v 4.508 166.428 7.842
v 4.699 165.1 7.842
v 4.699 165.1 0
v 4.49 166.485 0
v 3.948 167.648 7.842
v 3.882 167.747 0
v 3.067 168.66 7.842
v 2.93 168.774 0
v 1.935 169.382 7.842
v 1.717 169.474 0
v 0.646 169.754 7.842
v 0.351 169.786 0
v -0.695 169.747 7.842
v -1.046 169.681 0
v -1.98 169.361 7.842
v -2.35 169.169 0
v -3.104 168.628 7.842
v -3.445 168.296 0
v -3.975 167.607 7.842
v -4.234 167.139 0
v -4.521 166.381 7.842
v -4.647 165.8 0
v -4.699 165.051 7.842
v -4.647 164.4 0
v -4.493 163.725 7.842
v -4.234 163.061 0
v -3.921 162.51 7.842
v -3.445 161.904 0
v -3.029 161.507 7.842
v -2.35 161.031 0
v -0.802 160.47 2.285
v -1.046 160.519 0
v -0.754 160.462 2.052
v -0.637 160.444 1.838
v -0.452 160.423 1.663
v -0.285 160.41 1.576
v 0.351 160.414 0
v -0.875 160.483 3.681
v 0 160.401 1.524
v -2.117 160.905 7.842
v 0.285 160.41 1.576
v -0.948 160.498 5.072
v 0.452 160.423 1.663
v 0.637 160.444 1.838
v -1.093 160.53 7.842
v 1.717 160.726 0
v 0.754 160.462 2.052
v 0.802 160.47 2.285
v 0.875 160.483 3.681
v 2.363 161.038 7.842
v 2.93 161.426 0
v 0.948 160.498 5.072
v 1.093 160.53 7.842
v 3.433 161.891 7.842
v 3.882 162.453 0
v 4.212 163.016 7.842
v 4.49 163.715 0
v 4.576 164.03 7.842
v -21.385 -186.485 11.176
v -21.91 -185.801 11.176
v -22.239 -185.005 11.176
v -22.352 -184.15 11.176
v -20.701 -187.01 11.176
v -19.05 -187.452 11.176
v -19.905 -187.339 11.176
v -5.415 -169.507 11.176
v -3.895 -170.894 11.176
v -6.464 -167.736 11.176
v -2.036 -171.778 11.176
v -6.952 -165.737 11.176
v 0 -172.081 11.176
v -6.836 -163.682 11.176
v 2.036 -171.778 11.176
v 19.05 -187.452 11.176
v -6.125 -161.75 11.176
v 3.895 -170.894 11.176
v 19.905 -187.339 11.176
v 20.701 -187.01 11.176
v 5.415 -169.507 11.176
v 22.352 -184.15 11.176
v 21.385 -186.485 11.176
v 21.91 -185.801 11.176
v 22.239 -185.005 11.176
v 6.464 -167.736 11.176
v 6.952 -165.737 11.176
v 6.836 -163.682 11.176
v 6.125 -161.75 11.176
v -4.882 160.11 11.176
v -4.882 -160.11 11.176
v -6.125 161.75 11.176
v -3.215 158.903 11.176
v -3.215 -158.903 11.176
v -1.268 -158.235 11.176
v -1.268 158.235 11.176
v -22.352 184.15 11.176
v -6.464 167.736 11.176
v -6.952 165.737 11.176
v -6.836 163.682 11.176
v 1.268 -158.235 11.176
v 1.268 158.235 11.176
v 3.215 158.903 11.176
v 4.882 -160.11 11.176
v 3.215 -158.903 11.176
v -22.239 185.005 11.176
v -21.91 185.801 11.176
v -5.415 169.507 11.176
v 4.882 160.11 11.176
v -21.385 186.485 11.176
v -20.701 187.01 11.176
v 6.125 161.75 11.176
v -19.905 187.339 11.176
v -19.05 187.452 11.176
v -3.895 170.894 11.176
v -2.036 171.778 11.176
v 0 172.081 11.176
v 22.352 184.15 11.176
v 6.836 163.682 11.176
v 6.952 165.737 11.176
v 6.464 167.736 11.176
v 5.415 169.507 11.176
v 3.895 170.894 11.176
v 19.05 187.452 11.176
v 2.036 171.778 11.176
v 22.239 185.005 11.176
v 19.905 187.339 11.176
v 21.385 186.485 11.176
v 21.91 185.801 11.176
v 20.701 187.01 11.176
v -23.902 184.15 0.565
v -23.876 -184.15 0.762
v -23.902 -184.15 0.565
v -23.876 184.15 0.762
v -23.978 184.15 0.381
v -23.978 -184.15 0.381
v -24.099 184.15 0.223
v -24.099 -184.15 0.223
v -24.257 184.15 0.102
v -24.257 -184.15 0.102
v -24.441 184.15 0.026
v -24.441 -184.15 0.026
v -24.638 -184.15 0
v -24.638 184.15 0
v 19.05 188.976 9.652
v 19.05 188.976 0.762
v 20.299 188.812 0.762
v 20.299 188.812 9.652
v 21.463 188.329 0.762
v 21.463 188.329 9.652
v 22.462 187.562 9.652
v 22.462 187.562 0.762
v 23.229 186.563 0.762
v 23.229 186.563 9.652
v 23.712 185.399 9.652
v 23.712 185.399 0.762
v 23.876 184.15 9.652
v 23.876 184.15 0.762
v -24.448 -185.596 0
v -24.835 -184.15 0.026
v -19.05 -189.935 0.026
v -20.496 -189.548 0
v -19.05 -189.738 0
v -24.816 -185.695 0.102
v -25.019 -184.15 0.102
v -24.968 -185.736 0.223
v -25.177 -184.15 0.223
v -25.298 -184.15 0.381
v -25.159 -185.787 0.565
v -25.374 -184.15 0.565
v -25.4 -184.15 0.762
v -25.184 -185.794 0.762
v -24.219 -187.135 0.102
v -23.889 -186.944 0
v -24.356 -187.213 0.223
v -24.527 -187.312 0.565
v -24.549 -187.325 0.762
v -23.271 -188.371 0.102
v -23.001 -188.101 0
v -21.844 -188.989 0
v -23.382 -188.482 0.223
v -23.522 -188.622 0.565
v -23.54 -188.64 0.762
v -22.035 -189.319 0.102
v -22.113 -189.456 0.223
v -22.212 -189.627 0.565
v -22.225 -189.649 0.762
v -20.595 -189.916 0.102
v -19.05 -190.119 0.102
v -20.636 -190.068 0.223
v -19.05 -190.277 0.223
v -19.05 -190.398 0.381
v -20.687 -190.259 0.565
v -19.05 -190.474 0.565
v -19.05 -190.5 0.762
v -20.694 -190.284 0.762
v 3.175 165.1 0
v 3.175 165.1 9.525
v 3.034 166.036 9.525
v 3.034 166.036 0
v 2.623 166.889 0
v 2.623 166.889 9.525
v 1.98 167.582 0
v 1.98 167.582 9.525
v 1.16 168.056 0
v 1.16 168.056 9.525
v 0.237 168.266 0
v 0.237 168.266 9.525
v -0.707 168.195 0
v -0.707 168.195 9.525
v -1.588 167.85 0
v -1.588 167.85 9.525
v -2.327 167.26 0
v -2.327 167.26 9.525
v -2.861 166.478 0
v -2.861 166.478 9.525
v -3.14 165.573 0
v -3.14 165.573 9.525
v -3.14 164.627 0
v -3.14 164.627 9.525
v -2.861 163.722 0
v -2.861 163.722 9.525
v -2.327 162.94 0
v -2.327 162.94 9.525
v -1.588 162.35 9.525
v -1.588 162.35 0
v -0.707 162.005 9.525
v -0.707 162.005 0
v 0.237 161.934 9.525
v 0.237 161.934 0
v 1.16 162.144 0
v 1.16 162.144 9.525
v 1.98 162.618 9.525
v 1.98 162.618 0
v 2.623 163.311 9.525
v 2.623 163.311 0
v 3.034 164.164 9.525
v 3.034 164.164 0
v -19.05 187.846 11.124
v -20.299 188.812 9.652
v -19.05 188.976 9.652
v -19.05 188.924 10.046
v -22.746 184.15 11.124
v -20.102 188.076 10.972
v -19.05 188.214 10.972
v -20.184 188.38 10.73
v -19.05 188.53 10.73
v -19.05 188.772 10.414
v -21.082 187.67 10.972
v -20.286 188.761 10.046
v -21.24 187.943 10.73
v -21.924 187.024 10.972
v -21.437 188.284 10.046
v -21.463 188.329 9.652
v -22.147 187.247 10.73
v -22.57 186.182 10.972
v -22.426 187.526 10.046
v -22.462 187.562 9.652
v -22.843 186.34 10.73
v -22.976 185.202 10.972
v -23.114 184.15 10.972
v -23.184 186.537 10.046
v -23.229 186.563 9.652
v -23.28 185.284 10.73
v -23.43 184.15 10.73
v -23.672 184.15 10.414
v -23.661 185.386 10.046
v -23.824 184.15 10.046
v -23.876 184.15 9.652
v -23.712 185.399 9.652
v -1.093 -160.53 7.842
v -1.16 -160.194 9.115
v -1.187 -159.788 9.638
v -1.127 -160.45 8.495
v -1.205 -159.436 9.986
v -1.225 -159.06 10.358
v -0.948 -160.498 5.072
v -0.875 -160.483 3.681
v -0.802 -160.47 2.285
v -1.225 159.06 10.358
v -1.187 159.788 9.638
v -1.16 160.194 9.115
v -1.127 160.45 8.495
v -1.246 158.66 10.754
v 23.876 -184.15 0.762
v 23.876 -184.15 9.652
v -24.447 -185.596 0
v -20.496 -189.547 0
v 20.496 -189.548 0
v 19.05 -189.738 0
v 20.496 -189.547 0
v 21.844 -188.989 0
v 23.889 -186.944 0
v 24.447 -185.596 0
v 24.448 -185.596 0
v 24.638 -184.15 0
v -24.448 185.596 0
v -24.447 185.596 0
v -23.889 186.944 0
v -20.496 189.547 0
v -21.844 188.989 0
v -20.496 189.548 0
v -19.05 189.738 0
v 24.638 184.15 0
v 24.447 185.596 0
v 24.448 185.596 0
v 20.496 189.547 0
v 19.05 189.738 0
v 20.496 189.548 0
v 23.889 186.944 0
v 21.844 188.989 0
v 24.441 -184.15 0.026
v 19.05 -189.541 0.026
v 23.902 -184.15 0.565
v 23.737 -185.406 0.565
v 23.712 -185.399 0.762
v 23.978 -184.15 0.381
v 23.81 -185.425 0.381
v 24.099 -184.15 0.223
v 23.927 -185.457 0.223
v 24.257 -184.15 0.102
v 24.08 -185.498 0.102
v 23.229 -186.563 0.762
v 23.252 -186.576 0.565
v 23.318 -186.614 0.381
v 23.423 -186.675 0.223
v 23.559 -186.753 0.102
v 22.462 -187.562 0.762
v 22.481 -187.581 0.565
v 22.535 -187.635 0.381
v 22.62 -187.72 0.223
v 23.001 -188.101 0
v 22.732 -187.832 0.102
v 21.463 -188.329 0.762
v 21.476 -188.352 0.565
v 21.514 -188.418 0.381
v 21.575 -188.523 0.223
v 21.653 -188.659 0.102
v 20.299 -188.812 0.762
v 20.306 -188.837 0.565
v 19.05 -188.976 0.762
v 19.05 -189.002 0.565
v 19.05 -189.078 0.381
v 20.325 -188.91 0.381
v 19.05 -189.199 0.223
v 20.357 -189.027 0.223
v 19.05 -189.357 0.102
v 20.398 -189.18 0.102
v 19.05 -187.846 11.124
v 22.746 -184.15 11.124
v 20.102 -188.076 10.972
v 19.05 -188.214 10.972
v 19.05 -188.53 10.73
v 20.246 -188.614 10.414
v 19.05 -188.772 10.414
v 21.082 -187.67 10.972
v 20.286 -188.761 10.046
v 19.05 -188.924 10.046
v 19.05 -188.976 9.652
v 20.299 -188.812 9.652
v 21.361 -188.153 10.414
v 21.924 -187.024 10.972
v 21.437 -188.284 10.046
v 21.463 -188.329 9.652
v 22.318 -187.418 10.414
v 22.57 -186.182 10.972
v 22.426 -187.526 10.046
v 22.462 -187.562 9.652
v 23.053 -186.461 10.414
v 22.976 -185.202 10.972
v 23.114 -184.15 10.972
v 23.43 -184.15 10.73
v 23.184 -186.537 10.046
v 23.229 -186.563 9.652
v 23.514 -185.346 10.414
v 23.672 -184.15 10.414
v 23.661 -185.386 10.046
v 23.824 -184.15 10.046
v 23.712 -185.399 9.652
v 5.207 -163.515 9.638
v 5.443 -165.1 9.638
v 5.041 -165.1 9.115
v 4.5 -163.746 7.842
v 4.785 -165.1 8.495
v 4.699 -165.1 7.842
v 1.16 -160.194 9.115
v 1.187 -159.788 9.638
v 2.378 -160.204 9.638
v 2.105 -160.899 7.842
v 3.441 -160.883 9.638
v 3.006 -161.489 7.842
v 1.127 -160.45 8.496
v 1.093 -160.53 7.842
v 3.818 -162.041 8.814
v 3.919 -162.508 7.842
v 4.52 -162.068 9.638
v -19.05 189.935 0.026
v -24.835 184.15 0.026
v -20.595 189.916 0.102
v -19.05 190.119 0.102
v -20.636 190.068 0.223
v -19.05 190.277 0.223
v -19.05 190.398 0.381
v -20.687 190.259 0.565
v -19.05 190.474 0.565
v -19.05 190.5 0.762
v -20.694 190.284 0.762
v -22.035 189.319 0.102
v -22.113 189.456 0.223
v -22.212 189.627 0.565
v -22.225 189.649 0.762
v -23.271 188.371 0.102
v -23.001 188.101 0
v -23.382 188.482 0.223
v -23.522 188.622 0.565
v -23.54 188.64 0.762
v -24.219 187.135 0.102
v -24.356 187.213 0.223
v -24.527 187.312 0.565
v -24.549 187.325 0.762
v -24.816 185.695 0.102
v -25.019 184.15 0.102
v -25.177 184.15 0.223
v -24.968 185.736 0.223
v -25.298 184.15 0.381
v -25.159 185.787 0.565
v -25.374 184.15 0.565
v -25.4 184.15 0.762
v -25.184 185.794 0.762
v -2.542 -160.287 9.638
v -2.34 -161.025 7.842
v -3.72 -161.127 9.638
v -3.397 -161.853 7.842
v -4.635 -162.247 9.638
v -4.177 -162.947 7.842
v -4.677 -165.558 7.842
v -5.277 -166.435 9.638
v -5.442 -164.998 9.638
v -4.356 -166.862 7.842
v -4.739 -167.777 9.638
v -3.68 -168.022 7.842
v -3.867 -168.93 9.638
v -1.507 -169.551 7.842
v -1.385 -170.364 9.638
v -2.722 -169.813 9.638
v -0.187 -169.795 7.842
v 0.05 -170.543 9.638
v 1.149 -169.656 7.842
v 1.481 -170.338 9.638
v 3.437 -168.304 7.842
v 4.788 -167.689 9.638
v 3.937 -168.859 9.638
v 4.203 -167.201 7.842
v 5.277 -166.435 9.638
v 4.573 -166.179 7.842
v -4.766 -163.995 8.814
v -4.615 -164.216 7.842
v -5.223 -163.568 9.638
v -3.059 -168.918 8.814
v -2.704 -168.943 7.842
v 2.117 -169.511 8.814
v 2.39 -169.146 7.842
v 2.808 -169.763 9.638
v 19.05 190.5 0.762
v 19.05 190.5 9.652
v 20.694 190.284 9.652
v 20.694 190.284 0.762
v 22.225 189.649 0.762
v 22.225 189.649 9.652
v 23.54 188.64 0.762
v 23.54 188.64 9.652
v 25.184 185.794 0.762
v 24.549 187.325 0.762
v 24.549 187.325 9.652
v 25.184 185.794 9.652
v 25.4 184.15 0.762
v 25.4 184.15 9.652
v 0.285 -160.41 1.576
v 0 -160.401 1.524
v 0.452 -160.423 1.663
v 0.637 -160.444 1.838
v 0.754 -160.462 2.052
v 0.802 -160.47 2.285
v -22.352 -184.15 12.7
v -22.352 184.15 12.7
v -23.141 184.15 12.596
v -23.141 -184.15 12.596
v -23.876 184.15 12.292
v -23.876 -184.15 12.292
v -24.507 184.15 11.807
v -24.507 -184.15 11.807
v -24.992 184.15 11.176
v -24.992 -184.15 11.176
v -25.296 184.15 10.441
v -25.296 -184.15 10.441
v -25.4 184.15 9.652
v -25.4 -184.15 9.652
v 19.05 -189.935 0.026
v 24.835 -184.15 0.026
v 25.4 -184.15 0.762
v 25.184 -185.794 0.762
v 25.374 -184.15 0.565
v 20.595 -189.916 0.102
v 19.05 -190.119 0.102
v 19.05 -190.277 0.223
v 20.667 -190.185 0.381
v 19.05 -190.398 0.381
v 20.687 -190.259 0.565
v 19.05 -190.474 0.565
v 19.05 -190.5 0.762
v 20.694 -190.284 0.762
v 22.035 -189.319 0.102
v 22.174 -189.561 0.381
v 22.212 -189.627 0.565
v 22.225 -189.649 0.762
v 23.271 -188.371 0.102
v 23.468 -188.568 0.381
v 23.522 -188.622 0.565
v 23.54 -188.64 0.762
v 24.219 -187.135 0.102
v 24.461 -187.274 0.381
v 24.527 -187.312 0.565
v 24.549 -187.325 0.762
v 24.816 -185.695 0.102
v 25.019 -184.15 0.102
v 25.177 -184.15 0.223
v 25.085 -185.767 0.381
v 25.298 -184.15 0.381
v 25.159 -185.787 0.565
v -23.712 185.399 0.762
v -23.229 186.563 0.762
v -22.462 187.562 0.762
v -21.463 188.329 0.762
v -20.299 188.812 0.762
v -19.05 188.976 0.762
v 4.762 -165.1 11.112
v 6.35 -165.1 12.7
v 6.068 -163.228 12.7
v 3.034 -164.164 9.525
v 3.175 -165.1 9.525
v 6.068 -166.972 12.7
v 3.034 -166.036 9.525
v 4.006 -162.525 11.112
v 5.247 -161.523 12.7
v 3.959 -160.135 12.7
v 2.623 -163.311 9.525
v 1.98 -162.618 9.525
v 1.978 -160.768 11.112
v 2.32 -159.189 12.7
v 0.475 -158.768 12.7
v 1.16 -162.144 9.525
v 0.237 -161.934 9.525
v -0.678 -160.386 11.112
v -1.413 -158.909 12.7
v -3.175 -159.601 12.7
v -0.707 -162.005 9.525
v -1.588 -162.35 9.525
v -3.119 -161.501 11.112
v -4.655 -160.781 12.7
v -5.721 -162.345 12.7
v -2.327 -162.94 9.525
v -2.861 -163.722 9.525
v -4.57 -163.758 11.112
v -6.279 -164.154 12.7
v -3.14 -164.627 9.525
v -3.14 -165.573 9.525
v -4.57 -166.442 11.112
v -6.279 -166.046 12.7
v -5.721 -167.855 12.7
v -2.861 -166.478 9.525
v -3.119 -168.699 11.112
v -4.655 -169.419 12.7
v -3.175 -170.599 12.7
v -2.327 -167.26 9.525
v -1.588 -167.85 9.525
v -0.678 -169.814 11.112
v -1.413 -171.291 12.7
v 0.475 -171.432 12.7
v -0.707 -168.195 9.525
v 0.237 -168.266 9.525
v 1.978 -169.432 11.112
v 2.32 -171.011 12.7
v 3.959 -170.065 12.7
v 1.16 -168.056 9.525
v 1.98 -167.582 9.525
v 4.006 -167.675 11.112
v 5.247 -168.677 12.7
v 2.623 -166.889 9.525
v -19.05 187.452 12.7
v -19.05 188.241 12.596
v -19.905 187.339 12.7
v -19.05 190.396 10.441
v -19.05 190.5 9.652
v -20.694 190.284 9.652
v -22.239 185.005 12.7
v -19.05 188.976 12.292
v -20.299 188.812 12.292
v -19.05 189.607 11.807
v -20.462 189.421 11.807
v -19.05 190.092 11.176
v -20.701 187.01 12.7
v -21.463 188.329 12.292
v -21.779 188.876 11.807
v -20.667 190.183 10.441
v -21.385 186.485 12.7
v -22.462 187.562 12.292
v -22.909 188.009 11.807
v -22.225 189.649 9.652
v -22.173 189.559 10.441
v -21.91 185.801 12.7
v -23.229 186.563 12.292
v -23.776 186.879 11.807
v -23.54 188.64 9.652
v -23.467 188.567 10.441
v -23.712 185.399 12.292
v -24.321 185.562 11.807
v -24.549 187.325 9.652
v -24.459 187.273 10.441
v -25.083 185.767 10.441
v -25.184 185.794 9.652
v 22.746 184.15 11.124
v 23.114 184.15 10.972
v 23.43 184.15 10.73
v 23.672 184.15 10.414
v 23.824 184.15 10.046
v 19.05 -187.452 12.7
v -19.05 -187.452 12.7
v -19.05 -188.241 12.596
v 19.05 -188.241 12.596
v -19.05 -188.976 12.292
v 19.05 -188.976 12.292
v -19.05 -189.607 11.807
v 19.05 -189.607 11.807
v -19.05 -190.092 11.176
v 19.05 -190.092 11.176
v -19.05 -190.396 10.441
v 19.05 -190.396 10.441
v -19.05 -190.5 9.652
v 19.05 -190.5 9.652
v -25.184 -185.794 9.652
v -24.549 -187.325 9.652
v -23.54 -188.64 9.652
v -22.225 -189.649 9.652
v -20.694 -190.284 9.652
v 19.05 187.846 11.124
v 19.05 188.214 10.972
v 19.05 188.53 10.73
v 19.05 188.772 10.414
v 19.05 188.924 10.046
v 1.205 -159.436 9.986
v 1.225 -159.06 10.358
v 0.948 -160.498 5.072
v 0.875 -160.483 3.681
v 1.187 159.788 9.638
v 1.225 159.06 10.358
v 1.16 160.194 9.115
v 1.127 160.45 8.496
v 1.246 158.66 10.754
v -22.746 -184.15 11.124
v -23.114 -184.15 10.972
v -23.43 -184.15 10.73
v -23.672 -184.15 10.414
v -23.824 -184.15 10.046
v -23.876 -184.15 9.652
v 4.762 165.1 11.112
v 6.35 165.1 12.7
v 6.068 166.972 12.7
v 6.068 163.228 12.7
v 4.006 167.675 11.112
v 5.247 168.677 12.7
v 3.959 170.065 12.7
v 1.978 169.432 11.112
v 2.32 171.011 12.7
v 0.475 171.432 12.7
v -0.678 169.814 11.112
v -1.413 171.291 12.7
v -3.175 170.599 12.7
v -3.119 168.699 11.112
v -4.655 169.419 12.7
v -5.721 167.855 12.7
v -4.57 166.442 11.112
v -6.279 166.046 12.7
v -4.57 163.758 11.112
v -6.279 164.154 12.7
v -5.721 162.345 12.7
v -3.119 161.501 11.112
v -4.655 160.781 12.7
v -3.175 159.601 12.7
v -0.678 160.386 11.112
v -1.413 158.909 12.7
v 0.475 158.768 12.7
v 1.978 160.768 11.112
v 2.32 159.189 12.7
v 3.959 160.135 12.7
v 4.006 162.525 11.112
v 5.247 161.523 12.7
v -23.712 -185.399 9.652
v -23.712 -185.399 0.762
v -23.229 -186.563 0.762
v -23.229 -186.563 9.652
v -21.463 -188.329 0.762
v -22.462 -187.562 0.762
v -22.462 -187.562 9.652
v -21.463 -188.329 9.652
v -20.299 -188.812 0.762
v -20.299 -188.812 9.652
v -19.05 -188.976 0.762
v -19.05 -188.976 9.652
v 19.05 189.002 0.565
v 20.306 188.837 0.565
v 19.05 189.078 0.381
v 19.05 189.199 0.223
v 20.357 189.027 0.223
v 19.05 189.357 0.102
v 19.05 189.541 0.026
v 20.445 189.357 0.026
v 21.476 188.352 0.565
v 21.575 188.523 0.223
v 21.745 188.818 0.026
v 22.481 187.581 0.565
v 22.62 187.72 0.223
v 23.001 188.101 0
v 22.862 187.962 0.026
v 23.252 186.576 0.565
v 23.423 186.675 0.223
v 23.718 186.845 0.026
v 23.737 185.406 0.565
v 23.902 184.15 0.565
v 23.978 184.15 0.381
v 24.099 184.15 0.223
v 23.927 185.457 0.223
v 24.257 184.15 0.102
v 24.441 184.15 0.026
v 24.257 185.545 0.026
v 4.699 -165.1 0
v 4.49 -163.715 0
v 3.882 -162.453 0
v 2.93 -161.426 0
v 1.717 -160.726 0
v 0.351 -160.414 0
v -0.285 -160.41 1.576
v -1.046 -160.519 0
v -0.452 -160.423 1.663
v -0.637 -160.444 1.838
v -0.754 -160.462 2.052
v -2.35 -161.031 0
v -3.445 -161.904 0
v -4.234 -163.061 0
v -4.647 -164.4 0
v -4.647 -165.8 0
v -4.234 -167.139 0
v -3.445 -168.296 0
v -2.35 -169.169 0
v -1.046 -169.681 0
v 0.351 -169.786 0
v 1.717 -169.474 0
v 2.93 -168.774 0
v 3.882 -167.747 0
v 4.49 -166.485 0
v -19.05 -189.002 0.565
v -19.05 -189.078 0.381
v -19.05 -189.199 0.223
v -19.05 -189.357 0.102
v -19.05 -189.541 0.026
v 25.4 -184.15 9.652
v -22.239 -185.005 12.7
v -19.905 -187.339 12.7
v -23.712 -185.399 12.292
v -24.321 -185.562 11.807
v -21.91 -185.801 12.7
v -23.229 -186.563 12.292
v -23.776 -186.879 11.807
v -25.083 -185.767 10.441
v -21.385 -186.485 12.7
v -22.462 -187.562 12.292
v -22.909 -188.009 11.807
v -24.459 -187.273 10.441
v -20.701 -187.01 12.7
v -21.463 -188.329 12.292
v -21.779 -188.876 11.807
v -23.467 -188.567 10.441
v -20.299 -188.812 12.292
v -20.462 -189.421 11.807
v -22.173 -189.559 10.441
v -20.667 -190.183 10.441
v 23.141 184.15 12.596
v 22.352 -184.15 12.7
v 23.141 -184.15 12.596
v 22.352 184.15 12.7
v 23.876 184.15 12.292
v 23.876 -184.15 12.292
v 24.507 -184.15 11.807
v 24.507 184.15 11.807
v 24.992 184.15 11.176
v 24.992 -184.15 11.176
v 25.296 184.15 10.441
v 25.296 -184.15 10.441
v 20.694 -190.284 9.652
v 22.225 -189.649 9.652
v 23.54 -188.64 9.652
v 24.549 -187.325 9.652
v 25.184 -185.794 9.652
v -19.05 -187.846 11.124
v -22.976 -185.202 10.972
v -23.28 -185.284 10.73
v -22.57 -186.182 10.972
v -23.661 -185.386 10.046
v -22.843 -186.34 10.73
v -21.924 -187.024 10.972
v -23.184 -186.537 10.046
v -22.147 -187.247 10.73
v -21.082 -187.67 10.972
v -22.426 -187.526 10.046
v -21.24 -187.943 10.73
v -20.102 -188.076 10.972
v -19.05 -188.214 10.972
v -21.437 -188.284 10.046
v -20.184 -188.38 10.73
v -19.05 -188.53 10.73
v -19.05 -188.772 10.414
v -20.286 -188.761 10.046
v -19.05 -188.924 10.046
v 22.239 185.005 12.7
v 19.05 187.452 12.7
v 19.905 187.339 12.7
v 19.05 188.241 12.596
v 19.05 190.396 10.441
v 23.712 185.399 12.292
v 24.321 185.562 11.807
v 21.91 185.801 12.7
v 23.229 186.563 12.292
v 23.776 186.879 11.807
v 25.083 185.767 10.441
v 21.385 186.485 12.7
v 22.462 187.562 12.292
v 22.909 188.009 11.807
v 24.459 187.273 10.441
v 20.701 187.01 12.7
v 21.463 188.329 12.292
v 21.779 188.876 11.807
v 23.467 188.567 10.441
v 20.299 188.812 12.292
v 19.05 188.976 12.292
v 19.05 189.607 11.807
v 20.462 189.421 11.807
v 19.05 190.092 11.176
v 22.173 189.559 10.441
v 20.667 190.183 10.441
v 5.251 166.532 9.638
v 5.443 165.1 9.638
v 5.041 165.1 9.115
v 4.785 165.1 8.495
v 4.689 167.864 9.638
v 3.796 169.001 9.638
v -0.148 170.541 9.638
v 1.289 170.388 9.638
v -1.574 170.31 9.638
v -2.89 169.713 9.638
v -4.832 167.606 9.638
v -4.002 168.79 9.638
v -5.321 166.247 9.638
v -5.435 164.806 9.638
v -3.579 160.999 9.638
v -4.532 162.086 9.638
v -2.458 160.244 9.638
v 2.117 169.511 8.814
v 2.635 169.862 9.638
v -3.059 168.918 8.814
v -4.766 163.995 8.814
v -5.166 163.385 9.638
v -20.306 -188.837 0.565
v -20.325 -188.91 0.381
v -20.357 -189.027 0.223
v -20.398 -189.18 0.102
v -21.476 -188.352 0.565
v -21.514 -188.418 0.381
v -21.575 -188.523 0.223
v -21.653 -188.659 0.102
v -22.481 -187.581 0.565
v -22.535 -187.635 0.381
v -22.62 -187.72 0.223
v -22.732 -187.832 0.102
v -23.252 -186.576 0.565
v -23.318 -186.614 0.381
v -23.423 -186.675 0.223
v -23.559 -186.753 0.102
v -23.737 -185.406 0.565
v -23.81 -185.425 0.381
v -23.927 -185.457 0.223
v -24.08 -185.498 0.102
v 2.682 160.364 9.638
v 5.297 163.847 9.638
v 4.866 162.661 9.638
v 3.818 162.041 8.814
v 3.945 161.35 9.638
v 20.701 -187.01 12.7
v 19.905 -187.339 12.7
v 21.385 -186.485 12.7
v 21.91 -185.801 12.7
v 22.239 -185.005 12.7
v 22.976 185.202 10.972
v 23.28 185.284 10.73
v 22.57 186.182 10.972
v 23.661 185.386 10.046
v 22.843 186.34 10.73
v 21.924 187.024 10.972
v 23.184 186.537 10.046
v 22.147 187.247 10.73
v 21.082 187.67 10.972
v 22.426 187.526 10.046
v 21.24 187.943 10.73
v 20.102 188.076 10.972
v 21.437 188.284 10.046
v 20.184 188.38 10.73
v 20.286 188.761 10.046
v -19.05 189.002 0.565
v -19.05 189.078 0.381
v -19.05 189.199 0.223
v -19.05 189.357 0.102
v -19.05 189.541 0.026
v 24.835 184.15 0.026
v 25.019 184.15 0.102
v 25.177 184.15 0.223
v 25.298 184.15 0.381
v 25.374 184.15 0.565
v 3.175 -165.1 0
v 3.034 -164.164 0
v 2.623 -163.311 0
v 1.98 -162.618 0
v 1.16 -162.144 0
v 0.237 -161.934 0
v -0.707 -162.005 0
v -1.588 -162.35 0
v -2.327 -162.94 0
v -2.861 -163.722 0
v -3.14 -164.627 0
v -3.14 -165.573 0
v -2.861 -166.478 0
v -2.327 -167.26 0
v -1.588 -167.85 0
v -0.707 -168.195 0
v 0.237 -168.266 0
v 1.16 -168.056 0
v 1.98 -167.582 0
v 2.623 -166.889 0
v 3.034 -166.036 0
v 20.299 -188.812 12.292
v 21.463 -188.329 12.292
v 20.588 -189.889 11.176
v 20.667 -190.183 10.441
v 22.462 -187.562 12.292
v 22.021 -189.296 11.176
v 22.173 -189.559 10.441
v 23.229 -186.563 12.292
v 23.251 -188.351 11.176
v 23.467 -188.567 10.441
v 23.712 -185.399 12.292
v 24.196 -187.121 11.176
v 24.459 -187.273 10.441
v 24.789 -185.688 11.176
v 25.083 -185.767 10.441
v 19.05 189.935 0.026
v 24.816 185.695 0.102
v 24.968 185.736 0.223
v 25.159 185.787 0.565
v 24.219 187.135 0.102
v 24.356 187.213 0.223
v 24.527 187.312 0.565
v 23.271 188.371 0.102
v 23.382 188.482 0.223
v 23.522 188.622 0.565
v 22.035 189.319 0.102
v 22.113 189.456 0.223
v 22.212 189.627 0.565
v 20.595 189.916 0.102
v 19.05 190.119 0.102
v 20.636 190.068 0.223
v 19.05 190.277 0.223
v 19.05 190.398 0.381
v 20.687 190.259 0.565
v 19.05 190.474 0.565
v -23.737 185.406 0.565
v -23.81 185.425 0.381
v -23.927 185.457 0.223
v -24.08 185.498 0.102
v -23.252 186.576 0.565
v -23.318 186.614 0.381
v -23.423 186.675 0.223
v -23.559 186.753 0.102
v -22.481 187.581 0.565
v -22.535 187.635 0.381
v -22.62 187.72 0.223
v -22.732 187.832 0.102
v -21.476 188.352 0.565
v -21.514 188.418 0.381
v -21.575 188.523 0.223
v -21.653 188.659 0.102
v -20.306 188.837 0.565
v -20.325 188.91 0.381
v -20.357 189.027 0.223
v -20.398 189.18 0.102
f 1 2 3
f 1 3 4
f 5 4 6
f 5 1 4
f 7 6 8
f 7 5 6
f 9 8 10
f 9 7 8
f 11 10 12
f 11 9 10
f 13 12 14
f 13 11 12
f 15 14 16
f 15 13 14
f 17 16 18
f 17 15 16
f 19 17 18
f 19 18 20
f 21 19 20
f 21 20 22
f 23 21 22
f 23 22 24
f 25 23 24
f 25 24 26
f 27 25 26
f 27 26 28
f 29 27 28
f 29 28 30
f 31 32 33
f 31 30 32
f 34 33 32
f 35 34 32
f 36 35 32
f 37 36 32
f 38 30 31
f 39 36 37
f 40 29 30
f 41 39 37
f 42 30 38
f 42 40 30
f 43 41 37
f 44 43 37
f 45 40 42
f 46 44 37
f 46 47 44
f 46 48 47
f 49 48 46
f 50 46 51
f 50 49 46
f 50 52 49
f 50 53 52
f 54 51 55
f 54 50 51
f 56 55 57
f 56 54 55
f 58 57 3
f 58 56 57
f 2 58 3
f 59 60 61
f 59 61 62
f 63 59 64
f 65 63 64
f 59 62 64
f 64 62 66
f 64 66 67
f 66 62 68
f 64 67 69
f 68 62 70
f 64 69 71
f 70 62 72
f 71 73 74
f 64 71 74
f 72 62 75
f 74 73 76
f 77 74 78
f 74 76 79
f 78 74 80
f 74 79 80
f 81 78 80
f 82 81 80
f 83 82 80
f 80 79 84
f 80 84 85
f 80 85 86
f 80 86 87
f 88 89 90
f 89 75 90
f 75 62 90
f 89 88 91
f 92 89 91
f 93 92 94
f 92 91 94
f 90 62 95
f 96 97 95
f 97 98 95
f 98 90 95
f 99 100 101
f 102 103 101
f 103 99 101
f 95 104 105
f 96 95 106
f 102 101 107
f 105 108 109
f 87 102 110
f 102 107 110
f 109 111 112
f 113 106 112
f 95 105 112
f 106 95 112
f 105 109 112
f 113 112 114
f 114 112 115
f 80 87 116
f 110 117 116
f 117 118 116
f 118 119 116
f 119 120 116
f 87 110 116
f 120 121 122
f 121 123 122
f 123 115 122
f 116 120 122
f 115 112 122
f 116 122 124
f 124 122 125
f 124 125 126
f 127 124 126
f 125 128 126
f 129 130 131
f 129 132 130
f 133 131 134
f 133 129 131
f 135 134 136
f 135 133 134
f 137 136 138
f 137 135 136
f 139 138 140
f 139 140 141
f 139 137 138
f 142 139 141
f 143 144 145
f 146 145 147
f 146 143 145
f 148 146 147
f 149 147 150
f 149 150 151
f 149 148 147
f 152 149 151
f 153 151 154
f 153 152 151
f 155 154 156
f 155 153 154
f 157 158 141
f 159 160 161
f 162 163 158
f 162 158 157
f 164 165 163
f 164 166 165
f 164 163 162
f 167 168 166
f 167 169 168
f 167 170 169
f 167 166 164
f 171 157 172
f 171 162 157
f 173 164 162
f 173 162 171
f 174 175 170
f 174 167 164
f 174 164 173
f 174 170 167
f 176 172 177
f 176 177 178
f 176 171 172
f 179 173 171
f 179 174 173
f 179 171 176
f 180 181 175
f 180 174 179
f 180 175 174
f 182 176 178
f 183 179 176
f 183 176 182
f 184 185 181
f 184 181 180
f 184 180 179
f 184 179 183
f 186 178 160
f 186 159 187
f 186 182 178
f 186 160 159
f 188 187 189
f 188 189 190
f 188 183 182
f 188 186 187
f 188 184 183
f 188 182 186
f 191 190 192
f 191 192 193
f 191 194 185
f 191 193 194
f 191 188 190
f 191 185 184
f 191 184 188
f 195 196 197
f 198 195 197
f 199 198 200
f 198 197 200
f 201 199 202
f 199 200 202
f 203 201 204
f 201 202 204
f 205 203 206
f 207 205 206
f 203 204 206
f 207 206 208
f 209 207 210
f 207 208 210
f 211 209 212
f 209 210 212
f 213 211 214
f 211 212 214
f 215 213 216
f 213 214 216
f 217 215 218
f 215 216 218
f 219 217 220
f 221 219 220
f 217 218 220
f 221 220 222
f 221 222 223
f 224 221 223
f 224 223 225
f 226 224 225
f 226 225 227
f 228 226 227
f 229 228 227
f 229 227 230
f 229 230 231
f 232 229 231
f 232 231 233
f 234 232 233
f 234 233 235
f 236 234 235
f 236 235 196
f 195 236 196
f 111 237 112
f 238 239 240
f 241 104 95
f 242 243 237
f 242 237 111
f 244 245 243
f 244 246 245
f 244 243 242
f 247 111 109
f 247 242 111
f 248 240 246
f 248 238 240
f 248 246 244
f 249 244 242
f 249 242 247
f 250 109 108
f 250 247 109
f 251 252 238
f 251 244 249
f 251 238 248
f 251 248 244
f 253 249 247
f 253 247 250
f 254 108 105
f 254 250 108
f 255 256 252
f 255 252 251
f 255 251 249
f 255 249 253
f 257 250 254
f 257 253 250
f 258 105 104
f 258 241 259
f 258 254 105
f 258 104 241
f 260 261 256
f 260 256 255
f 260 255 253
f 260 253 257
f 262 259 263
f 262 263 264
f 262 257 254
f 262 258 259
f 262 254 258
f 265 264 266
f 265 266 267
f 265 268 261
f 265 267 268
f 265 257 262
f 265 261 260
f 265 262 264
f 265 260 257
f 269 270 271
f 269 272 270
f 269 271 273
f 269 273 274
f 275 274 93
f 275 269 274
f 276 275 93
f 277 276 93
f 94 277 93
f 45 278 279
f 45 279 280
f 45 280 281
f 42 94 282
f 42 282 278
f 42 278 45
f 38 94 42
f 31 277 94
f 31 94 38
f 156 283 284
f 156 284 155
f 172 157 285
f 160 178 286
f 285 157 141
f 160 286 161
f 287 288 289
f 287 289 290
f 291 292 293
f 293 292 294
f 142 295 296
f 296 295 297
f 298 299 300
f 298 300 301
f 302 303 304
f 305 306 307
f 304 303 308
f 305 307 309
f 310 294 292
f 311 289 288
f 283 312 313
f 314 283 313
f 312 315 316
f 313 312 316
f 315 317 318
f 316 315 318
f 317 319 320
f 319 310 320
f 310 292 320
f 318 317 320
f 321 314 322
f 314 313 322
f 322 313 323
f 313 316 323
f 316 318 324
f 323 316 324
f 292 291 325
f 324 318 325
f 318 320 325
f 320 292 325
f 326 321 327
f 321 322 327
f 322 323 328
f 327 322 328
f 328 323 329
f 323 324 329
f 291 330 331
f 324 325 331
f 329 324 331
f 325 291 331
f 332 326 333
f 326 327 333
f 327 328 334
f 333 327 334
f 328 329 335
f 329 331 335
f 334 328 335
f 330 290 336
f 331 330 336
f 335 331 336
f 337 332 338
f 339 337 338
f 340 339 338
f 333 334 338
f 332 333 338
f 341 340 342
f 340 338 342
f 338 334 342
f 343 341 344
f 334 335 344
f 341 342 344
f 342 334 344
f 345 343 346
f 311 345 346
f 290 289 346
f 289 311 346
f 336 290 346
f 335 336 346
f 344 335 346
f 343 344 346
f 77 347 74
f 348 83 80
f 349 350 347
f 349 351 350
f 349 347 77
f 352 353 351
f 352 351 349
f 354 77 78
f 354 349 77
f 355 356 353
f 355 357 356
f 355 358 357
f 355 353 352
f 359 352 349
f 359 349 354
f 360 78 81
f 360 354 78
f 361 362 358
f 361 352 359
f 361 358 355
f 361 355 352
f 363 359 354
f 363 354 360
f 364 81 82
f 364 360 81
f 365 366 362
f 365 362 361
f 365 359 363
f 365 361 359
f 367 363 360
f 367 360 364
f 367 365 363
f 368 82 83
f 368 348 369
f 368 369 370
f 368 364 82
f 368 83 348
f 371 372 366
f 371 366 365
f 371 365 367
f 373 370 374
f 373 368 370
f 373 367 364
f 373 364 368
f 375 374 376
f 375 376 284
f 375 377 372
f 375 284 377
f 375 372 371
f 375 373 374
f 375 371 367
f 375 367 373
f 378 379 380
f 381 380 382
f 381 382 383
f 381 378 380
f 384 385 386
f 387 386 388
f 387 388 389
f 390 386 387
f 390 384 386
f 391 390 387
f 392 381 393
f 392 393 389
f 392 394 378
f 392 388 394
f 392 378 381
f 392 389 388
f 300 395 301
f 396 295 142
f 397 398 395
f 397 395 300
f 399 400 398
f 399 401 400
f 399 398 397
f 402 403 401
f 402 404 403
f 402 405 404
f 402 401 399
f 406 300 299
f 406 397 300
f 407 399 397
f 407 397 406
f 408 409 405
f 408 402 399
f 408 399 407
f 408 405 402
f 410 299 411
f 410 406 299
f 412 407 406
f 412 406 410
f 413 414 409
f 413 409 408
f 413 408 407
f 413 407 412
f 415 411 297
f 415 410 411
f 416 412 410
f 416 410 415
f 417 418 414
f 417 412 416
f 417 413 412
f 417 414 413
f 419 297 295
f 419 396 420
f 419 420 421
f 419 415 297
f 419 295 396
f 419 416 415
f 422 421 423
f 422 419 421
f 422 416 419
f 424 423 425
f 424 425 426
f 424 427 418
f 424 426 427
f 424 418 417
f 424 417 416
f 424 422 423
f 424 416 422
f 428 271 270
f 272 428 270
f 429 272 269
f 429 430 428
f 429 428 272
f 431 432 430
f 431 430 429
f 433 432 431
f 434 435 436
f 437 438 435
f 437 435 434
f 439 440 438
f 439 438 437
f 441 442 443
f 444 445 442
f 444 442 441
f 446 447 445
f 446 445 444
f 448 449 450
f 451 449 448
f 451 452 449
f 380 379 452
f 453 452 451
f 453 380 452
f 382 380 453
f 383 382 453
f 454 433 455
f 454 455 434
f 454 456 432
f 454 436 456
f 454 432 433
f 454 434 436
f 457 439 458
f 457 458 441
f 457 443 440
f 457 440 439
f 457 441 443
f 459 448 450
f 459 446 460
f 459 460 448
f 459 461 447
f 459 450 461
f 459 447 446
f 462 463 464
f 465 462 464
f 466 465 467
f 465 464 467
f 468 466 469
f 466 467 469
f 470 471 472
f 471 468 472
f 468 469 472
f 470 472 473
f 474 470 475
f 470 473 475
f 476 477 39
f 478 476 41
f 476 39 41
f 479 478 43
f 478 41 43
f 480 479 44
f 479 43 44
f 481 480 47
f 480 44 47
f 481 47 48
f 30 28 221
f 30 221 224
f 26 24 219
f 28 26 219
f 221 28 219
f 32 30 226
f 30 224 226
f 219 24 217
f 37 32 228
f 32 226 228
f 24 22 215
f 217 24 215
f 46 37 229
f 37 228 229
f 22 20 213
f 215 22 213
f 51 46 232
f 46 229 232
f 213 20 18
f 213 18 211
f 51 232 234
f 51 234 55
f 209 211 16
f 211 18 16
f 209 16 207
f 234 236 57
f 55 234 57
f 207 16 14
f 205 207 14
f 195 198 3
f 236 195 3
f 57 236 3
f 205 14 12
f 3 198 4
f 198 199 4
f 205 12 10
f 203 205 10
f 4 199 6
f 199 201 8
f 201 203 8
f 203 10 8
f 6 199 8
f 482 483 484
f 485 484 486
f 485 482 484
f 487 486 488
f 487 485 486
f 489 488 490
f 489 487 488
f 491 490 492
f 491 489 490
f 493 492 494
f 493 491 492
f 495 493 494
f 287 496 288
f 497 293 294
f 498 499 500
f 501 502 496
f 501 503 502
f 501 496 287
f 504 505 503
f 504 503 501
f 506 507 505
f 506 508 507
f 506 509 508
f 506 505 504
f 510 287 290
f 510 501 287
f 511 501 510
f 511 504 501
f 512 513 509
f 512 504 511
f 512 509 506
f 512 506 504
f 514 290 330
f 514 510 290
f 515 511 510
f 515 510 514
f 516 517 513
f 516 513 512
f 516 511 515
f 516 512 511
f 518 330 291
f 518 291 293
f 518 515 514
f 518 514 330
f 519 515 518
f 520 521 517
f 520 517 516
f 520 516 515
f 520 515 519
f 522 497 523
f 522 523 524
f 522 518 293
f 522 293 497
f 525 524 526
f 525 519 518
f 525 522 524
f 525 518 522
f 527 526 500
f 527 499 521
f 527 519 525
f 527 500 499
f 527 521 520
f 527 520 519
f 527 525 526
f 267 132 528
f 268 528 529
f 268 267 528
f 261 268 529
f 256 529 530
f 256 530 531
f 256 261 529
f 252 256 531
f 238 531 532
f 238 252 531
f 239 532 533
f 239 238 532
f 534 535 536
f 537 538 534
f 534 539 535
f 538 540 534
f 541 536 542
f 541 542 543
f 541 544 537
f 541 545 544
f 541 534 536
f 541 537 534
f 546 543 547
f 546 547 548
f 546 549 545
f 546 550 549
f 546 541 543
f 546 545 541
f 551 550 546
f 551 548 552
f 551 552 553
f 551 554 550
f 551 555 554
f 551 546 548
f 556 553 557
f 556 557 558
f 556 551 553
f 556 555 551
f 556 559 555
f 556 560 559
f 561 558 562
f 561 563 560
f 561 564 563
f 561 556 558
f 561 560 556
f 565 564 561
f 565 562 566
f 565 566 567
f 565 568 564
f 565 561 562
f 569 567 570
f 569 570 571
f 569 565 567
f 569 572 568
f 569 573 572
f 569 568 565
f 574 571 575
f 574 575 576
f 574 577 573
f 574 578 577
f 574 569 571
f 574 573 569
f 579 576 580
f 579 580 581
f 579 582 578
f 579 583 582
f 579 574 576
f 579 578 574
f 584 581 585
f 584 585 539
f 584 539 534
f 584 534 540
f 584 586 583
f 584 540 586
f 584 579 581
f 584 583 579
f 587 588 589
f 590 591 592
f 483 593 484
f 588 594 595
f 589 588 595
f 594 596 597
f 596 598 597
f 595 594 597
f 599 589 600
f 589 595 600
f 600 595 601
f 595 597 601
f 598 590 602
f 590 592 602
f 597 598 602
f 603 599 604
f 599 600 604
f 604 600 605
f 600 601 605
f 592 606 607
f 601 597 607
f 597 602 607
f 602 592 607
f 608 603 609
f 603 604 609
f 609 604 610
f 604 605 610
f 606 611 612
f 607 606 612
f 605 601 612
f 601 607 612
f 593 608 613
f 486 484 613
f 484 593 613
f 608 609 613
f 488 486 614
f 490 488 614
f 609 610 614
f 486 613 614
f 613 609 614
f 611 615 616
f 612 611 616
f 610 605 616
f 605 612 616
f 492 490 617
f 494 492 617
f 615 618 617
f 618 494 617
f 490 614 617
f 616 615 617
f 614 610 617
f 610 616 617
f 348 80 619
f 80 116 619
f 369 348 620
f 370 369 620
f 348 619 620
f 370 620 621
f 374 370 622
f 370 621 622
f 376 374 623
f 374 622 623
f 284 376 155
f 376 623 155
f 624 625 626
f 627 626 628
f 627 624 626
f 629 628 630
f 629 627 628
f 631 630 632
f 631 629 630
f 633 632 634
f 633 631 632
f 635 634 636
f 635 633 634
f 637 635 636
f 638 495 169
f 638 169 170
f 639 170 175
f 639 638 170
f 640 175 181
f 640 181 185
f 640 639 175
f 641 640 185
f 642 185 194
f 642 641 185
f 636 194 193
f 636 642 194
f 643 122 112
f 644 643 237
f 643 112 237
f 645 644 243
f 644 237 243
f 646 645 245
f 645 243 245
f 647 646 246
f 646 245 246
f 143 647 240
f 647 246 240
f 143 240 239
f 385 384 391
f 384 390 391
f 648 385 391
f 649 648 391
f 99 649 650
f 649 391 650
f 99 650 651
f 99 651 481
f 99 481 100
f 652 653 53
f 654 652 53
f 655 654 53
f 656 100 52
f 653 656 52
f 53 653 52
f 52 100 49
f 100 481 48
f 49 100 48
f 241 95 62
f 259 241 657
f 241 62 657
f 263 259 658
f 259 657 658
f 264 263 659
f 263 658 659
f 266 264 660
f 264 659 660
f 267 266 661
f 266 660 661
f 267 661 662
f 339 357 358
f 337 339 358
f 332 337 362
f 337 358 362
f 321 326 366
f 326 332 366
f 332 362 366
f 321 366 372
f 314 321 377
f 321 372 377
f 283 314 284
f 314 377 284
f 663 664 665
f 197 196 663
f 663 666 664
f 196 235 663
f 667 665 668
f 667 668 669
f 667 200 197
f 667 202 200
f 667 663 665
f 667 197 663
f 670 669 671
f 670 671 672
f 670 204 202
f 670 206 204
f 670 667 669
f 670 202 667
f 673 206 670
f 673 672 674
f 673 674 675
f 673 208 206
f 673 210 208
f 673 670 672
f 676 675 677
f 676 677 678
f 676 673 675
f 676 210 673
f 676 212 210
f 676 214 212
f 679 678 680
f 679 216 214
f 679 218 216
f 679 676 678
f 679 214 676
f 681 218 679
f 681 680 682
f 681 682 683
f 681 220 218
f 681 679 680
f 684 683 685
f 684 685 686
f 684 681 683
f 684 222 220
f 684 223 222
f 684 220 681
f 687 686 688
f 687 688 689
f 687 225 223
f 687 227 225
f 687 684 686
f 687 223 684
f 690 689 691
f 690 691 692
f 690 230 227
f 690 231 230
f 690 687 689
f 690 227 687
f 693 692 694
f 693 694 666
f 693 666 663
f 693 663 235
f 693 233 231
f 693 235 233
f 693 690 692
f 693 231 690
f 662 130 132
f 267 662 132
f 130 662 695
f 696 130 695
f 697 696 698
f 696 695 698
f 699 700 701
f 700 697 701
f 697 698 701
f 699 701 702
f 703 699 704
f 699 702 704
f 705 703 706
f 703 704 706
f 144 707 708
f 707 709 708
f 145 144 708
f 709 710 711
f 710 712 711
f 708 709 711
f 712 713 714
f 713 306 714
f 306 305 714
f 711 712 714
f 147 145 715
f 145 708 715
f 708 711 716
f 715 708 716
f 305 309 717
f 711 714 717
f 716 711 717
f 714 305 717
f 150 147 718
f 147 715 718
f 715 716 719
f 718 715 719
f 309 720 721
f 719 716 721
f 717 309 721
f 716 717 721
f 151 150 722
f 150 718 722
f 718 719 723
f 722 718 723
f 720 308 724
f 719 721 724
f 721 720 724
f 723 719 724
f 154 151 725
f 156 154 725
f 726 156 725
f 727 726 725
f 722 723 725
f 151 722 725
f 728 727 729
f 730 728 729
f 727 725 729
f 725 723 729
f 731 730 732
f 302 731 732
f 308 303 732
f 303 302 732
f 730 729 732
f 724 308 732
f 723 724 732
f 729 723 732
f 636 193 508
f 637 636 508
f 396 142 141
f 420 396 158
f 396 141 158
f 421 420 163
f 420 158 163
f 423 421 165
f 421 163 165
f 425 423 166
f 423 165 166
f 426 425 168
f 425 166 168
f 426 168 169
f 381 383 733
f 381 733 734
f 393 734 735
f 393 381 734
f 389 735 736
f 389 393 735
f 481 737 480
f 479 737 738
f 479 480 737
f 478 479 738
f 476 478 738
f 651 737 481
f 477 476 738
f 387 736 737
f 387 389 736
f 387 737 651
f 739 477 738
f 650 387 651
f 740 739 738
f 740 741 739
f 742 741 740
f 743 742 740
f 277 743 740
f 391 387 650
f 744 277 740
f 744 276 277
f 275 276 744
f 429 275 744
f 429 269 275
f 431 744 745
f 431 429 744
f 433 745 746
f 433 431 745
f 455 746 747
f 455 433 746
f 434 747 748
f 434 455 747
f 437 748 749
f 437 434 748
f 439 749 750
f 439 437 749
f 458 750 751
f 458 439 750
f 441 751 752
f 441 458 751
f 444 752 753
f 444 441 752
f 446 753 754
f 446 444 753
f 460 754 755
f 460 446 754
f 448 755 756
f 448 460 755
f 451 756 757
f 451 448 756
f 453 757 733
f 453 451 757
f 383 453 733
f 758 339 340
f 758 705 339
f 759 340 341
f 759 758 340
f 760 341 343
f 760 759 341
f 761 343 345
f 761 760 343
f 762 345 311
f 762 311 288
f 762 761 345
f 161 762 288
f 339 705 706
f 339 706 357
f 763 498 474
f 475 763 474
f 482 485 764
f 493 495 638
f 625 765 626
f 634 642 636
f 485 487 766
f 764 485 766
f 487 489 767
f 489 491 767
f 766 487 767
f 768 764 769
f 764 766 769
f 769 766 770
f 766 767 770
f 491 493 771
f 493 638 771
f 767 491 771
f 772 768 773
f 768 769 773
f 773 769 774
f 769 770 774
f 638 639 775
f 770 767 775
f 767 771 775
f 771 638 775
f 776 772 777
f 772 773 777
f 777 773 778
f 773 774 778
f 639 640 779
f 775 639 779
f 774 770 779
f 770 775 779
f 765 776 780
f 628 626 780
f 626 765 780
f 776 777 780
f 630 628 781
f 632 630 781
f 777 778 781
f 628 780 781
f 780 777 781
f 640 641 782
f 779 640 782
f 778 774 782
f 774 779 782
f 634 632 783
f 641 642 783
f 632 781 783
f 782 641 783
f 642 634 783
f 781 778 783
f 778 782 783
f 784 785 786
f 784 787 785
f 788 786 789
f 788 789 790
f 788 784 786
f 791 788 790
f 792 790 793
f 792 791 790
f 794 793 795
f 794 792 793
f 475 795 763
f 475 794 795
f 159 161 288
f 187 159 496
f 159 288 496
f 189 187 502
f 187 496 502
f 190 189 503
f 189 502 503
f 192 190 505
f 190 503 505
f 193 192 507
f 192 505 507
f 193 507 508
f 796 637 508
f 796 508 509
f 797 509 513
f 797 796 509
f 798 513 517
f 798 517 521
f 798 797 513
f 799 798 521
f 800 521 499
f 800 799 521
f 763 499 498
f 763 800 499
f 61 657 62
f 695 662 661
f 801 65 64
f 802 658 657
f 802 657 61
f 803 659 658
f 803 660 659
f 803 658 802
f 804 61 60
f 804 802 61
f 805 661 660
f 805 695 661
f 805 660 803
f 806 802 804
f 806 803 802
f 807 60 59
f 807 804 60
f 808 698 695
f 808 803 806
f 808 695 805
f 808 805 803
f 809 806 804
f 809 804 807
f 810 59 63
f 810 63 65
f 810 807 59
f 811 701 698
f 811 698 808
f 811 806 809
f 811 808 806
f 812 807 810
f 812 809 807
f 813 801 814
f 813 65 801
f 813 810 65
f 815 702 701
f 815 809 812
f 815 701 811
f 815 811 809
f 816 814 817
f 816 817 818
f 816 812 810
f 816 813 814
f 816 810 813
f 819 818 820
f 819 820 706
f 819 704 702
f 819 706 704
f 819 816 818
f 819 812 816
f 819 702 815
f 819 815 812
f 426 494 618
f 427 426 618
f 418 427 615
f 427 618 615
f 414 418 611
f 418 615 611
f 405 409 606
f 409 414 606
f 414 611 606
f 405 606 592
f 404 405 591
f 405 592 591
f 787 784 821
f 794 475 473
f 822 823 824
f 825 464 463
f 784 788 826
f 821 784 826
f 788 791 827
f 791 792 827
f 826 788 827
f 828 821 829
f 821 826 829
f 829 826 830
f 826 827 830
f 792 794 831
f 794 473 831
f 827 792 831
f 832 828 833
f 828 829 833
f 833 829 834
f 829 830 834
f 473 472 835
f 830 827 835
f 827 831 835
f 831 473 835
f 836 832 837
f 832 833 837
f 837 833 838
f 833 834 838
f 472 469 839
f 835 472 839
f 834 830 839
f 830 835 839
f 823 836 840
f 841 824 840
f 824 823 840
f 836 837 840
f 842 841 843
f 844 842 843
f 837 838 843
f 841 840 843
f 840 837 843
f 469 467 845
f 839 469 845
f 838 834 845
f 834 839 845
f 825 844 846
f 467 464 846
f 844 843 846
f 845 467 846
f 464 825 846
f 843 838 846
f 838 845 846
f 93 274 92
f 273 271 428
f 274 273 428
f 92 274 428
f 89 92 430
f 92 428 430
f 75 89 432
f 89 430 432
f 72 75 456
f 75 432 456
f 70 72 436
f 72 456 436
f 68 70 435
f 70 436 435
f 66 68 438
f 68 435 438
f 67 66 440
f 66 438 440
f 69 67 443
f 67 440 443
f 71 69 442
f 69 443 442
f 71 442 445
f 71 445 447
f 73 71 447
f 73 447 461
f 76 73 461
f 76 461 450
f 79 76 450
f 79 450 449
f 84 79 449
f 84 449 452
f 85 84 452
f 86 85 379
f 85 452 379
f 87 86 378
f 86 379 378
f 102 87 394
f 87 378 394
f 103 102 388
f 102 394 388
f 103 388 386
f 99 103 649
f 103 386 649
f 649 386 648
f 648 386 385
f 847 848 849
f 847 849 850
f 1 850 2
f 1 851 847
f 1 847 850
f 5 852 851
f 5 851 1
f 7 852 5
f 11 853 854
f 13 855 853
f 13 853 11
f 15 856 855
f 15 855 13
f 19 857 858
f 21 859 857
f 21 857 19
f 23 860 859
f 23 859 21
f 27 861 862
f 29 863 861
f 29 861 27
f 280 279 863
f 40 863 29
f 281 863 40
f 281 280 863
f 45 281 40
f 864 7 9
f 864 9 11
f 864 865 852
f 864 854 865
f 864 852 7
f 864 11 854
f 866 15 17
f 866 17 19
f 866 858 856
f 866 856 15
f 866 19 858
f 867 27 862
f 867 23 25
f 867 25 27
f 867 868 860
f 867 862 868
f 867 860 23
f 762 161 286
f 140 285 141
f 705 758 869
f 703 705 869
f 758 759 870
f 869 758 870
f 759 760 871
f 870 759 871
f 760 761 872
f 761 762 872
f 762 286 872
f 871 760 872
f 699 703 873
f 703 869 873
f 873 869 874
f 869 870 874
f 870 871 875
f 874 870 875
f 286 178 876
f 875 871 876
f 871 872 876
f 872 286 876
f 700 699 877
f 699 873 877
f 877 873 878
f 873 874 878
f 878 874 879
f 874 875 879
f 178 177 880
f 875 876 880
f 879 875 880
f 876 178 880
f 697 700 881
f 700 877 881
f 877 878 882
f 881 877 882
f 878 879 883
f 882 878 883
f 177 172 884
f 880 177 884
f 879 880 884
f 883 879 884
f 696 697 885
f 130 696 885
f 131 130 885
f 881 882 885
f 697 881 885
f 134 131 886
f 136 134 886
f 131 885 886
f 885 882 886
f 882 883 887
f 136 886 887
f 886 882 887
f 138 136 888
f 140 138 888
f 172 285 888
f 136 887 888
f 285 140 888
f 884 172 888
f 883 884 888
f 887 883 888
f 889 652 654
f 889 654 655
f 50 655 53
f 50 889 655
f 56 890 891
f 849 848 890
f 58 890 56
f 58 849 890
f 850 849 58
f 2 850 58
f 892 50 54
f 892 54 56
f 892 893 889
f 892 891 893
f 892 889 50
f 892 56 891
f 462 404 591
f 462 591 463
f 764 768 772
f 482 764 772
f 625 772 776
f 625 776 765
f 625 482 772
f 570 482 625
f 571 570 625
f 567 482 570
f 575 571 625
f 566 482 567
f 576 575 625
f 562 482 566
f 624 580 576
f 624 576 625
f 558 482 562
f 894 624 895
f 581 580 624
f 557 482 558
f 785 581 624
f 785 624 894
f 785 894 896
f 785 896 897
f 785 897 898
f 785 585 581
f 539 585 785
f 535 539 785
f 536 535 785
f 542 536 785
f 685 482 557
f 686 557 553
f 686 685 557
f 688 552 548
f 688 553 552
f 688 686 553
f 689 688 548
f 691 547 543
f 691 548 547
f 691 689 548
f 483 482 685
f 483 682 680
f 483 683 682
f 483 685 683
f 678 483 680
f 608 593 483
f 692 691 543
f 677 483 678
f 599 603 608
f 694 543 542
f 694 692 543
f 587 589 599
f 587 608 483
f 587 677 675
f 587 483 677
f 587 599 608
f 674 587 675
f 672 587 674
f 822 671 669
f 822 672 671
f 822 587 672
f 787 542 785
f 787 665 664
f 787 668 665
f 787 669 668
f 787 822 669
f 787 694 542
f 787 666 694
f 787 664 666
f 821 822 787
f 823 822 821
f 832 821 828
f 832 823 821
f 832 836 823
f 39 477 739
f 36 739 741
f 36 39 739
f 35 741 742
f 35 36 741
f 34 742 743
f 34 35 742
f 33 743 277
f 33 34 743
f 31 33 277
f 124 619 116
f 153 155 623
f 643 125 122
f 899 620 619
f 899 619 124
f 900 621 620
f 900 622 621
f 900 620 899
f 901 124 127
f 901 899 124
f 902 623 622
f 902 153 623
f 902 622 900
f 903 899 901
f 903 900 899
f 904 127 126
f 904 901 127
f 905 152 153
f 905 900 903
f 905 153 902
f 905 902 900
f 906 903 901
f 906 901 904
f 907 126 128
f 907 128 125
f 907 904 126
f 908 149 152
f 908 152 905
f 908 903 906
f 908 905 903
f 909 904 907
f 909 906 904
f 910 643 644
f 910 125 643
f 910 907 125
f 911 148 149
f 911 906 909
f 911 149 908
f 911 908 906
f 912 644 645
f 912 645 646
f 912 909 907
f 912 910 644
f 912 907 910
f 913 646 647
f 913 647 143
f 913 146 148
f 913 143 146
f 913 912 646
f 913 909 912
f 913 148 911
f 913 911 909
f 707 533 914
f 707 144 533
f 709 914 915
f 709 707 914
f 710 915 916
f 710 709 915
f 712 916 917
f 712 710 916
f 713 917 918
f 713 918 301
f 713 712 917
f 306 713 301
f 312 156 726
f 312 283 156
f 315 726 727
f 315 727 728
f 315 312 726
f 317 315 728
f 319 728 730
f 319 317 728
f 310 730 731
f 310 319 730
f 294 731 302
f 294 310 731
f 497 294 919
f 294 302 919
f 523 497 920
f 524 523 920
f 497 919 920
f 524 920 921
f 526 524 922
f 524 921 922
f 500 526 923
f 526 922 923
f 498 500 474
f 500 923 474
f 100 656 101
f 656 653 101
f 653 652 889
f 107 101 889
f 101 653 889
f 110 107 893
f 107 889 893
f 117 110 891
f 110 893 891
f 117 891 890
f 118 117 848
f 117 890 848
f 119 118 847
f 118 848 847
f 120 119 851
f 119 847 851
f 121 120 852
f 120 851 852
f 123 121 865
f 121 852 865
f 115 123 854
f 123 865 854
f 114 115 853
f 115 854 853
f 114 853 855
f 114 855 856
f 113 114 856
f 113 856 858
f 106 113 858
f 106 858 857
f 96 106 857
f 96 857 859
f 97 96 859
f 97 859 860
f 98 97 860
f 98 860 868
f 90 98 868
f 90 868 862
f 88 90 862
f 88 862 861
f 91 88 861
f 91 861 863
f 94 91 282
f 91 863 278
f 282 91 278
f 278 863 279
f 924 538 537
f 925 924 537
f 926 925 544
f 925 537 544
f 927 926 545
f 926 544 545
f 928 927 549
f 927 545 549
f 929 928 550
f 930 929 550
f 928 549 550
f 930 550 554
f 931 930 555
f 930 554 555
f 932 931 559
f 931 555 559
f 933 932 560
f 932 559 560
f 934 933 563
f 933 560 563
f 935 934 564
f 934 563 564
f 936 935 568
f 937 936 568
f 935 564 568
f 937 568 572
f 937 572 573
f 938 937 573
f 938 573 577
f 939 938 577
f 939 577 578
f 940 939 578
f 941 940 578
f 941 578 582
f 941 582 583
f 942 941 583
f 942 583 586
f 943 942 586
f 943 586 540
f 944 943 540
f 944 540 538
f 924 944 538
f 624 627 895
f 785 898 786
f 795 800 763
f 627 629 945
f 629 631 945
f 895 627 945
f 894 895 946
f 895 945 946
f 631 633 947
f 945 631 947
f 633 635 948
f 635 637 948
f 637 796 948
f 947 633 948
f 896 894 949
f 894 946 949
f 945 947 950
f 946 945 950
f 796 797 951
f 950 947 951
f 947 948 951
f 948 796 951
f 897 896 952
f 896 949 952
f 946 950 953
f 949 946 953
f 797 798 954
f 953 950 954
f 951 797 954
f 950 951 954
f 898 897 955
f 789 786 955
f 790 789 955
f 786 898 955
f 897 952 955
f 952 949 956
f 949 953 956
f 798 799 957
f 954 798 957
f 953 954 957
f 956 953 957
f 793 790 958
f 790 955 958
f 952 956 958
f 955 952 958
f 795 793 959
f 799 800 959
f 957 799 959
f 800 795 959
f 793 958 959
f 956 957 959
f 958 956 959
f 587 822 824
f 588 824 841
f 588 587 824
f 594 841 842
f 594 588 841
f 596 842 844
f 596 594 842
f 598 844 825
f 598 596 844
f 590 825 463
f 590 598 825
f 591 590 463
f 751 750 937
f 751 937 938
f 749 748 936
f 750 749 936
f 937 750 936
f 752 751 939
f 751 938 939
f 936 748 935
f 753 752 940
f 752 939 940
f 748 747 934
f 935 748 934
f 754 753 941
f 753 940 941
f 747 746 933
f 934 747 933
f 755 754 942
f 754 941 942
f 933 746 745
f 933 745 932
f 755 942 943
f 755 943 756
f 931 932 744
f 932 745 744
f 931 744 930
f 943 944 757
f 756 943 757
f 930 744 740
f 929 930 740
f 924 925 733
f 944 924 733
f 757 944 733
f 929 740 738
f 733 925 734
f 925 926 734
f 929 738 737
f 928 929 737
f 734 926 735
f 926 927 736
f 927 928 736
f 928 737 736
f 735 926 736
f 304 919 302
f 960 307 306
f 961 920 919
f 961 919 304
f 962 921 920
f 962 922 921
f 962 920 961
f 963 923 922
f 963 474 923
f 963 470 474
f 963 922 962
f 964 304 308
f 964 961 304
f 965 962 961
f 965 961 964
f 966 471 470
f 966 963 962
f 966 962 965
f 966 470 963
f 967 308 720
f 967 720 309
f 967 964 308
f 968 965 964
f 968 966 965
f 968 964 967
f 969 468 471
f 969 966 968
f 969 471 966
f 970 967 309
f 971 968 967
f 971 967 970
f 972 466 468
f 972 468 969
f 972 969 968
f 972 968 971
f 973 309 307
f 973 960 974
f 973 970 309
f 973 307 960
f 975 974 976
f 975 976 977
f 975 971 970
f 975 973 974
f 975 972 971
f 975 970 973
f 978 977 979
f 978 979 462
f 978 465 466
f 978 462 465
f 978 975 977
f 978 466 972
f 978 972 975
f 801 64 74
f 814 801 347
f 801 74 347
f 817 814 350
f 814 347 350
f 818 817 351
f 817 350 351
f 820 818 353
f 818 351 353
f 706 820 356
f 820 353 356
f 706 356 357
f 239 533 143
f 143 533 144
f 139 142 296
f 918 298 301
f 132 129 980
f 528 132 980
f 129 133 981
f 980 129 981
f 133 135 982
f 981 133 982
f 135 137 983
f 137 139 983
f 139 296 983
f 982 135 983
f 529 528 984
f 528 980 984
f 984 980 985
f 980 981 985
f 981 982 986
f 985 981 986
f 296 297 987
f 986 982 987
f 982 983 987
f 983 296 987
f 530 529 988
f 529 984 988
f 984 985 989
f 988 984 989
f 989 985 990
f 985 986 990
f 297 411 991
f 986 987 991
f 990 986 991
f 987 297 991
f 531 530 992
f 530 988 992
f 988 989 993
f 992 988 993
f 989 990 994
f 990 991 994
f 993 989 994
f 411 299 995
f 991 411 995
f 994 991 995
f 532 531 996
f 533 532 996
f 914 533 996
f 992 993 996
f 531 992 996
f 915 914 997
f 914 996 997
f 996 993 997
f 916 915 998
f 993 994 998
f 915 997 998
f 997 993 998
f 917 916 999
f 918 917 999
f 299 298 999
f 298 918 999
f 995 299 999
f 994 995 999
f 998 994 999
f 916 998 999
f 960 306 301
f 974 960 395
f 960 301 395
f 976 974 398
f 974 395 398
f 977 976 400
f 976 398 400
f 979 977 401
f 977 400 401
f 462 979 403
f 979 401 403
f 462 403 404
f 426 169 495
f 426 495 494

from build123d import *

# Parameters (mm, degrees)
SKETCH1_W          = 50.8
SKETCH1_H          = 381
BASE_EXTRUDE_DEPTH = 12.7
SKETCH2_R          = 3.175
CUT_EXTRUDE1_DEPTH = 193.605036279
CHAMFER1_SIZE      = 3.175
FILLET1_R          = 6.35
FILLET2_R          = 3.048
SHELL1_T           = -1.524
RIB1_REACH         = 194.511
SKETCH3_WALLS_W    = 1.524
SKETCH3_WALLS_H    = 717.22110579
RIB1_DRAFT_ANGLE   = 3
FILLET3_R          = 0.80298
FILLET4_R          = 0.762
FILLET5_R          = 2.54


with BuildPart() as part:
    # Sketch1 → Base-Extrude (new body)
    with BuildSketch(Plane.XY):
        Rectangle(SKETCH1_W, SKETCH1_H)
    extrude(amount=BASE_EXTRUDE_DEPTH)

    # Sketch2 → Cut-Extrude1 (cut, through all)
    with BuildSketch(Plane.XY.offset(12.7)):
        with Locations((0, -165.1)):
            Circle(SKETCH2_R)
        with Locations((0, 165.1)):
            Circle(SKETCH2_R)
    extrude(amount=-CUT_EXTRUDE1_DEPTH, mode=Mode.SUBTRACT)

    # Chamfer1
    chamfer1_edges = [part.edges().sort_by_distance(p)[0] for p in [
        (-3.175, -165.1, 12.7),
        (-3.175, 165.1, 12.7),
    ]]
    chamfer(chamfer1_edges, length=CHAMFER1_SIZE)

    # Fillet1
    fillet1_edges = [part.edges().sort_by_distance(p)[0] for p in [
        (25.4, -190.5, 6.35),
        (-25.4, -190.5, 6.35),
        (-25.4, 190.5, 6.35),
        (25.4, 190.5, 6.35),
    ]]
    fillet(fillet1_edges, radius=FILLET1_R)

    # Fillet2
    fillet2_edges = [part.edges().sort_by_distance(p)[0] for p in [
        (25.4, 0, 12.7),
        (0, -190.5, 12.7),
        (0, 190.5, 12.7),
        (-25.4, 0, 12.7),
        (23.540128061, 188.640128061, 12.7),
        (-23.540128061, 188.640128061, 12.7),
        (-23.540128061, -188.640128061, 12.7),
        (23.540128061, -188.640128061, 12.7),
    ]]
    fillet(fillet2_edges, radius=FILLET2_R)

    # Shell1
    shell1_openings = [part.faces().sort_by_distance(p)[0] for p in [
        (0, 0, 0),
    ]]
    offset(amount=SHELL1_T, openings=shell1_openings, kind=Kind.INTERSECTION)

    # Sketch3 walls → Rib1 (add, up to next)
    with BuildSketch(Plane(origin=(0, 0, 1.524), x_dir=(-1, 0, 0), z_dir=(0, 0, -1)), mode=Mode.PRIVATE) as rib1_sk1:
        Rectangle(SKETCH3_WALLS_W, SKETCH3_WALLS_H)
    rib1_tool1 = extrude(rib1_sk1.sketch, amount=-RIB1_REACH, mode=Mode.PRIVATE) - part.part
    add(rib1_tool1.solids().sort_by_distance((0, 0, 1.524))[0])

    # Rib1 draft
    rib1_draft_faces = [part.faces().sort_by_distance(p)[0] for p in [
        (0.762, 0, 1.905),
        (-0.762, 0, 1.905),
    ]]
    draft(rib1_draft_faces, Plane(origin=(0, 0, 1.524), x_dir=(-1, 0, 0), z_dir=(0, 0, -1)), RIB1_DRAFT_ANGLE)

    # Fillet3
    fillet3_edges = [part.edges().sort_by_distance(p)[0] for p in [
        (0.762, 0, 1.524),
        (-0.762, 0, 1.524),
    ]]
    fillet(fillet3_edges, radius=FILLET3_R - 0.0001)  # a hair under: the kernel refuses the full size

    # Fillet4
    fillet4_edges = [part.edges().sort_by_distance(p)[0] for p in [
        (25.4, 0, 0),
        (0, -190.5, 0),
        (-25.4, 0, 0),
        (0, 190.5, 0),
        (23.540128061, 188.640128061, 0),
        (-23.540128061, 188.640128061, 0),
        (-23.540128061, -188.640128061, 0),
        (23.540128061, -188.640128061, 0),
        (23.876, 0, 0),
        (-23.876, 0, 0),
        (0, -188.976, 0),
        (0, 188.976, 0),
    ]]
    fillet(fillet4_edges, radius=FILLET4_R - 0.0001)  # a hair under: the kernel refuses the full size

    # Fillet5
    fillet5_edges = [part.edges().sort_by_distance(p)[0] for p in [
        (-2.888343865, -168.80649035, 8.893738531),
        (-2.888343865, 168.80649035, 8.893738531),
    ]]
    fillet(fillet5_edges, radius=FILLET5_R)


solid = part.part
